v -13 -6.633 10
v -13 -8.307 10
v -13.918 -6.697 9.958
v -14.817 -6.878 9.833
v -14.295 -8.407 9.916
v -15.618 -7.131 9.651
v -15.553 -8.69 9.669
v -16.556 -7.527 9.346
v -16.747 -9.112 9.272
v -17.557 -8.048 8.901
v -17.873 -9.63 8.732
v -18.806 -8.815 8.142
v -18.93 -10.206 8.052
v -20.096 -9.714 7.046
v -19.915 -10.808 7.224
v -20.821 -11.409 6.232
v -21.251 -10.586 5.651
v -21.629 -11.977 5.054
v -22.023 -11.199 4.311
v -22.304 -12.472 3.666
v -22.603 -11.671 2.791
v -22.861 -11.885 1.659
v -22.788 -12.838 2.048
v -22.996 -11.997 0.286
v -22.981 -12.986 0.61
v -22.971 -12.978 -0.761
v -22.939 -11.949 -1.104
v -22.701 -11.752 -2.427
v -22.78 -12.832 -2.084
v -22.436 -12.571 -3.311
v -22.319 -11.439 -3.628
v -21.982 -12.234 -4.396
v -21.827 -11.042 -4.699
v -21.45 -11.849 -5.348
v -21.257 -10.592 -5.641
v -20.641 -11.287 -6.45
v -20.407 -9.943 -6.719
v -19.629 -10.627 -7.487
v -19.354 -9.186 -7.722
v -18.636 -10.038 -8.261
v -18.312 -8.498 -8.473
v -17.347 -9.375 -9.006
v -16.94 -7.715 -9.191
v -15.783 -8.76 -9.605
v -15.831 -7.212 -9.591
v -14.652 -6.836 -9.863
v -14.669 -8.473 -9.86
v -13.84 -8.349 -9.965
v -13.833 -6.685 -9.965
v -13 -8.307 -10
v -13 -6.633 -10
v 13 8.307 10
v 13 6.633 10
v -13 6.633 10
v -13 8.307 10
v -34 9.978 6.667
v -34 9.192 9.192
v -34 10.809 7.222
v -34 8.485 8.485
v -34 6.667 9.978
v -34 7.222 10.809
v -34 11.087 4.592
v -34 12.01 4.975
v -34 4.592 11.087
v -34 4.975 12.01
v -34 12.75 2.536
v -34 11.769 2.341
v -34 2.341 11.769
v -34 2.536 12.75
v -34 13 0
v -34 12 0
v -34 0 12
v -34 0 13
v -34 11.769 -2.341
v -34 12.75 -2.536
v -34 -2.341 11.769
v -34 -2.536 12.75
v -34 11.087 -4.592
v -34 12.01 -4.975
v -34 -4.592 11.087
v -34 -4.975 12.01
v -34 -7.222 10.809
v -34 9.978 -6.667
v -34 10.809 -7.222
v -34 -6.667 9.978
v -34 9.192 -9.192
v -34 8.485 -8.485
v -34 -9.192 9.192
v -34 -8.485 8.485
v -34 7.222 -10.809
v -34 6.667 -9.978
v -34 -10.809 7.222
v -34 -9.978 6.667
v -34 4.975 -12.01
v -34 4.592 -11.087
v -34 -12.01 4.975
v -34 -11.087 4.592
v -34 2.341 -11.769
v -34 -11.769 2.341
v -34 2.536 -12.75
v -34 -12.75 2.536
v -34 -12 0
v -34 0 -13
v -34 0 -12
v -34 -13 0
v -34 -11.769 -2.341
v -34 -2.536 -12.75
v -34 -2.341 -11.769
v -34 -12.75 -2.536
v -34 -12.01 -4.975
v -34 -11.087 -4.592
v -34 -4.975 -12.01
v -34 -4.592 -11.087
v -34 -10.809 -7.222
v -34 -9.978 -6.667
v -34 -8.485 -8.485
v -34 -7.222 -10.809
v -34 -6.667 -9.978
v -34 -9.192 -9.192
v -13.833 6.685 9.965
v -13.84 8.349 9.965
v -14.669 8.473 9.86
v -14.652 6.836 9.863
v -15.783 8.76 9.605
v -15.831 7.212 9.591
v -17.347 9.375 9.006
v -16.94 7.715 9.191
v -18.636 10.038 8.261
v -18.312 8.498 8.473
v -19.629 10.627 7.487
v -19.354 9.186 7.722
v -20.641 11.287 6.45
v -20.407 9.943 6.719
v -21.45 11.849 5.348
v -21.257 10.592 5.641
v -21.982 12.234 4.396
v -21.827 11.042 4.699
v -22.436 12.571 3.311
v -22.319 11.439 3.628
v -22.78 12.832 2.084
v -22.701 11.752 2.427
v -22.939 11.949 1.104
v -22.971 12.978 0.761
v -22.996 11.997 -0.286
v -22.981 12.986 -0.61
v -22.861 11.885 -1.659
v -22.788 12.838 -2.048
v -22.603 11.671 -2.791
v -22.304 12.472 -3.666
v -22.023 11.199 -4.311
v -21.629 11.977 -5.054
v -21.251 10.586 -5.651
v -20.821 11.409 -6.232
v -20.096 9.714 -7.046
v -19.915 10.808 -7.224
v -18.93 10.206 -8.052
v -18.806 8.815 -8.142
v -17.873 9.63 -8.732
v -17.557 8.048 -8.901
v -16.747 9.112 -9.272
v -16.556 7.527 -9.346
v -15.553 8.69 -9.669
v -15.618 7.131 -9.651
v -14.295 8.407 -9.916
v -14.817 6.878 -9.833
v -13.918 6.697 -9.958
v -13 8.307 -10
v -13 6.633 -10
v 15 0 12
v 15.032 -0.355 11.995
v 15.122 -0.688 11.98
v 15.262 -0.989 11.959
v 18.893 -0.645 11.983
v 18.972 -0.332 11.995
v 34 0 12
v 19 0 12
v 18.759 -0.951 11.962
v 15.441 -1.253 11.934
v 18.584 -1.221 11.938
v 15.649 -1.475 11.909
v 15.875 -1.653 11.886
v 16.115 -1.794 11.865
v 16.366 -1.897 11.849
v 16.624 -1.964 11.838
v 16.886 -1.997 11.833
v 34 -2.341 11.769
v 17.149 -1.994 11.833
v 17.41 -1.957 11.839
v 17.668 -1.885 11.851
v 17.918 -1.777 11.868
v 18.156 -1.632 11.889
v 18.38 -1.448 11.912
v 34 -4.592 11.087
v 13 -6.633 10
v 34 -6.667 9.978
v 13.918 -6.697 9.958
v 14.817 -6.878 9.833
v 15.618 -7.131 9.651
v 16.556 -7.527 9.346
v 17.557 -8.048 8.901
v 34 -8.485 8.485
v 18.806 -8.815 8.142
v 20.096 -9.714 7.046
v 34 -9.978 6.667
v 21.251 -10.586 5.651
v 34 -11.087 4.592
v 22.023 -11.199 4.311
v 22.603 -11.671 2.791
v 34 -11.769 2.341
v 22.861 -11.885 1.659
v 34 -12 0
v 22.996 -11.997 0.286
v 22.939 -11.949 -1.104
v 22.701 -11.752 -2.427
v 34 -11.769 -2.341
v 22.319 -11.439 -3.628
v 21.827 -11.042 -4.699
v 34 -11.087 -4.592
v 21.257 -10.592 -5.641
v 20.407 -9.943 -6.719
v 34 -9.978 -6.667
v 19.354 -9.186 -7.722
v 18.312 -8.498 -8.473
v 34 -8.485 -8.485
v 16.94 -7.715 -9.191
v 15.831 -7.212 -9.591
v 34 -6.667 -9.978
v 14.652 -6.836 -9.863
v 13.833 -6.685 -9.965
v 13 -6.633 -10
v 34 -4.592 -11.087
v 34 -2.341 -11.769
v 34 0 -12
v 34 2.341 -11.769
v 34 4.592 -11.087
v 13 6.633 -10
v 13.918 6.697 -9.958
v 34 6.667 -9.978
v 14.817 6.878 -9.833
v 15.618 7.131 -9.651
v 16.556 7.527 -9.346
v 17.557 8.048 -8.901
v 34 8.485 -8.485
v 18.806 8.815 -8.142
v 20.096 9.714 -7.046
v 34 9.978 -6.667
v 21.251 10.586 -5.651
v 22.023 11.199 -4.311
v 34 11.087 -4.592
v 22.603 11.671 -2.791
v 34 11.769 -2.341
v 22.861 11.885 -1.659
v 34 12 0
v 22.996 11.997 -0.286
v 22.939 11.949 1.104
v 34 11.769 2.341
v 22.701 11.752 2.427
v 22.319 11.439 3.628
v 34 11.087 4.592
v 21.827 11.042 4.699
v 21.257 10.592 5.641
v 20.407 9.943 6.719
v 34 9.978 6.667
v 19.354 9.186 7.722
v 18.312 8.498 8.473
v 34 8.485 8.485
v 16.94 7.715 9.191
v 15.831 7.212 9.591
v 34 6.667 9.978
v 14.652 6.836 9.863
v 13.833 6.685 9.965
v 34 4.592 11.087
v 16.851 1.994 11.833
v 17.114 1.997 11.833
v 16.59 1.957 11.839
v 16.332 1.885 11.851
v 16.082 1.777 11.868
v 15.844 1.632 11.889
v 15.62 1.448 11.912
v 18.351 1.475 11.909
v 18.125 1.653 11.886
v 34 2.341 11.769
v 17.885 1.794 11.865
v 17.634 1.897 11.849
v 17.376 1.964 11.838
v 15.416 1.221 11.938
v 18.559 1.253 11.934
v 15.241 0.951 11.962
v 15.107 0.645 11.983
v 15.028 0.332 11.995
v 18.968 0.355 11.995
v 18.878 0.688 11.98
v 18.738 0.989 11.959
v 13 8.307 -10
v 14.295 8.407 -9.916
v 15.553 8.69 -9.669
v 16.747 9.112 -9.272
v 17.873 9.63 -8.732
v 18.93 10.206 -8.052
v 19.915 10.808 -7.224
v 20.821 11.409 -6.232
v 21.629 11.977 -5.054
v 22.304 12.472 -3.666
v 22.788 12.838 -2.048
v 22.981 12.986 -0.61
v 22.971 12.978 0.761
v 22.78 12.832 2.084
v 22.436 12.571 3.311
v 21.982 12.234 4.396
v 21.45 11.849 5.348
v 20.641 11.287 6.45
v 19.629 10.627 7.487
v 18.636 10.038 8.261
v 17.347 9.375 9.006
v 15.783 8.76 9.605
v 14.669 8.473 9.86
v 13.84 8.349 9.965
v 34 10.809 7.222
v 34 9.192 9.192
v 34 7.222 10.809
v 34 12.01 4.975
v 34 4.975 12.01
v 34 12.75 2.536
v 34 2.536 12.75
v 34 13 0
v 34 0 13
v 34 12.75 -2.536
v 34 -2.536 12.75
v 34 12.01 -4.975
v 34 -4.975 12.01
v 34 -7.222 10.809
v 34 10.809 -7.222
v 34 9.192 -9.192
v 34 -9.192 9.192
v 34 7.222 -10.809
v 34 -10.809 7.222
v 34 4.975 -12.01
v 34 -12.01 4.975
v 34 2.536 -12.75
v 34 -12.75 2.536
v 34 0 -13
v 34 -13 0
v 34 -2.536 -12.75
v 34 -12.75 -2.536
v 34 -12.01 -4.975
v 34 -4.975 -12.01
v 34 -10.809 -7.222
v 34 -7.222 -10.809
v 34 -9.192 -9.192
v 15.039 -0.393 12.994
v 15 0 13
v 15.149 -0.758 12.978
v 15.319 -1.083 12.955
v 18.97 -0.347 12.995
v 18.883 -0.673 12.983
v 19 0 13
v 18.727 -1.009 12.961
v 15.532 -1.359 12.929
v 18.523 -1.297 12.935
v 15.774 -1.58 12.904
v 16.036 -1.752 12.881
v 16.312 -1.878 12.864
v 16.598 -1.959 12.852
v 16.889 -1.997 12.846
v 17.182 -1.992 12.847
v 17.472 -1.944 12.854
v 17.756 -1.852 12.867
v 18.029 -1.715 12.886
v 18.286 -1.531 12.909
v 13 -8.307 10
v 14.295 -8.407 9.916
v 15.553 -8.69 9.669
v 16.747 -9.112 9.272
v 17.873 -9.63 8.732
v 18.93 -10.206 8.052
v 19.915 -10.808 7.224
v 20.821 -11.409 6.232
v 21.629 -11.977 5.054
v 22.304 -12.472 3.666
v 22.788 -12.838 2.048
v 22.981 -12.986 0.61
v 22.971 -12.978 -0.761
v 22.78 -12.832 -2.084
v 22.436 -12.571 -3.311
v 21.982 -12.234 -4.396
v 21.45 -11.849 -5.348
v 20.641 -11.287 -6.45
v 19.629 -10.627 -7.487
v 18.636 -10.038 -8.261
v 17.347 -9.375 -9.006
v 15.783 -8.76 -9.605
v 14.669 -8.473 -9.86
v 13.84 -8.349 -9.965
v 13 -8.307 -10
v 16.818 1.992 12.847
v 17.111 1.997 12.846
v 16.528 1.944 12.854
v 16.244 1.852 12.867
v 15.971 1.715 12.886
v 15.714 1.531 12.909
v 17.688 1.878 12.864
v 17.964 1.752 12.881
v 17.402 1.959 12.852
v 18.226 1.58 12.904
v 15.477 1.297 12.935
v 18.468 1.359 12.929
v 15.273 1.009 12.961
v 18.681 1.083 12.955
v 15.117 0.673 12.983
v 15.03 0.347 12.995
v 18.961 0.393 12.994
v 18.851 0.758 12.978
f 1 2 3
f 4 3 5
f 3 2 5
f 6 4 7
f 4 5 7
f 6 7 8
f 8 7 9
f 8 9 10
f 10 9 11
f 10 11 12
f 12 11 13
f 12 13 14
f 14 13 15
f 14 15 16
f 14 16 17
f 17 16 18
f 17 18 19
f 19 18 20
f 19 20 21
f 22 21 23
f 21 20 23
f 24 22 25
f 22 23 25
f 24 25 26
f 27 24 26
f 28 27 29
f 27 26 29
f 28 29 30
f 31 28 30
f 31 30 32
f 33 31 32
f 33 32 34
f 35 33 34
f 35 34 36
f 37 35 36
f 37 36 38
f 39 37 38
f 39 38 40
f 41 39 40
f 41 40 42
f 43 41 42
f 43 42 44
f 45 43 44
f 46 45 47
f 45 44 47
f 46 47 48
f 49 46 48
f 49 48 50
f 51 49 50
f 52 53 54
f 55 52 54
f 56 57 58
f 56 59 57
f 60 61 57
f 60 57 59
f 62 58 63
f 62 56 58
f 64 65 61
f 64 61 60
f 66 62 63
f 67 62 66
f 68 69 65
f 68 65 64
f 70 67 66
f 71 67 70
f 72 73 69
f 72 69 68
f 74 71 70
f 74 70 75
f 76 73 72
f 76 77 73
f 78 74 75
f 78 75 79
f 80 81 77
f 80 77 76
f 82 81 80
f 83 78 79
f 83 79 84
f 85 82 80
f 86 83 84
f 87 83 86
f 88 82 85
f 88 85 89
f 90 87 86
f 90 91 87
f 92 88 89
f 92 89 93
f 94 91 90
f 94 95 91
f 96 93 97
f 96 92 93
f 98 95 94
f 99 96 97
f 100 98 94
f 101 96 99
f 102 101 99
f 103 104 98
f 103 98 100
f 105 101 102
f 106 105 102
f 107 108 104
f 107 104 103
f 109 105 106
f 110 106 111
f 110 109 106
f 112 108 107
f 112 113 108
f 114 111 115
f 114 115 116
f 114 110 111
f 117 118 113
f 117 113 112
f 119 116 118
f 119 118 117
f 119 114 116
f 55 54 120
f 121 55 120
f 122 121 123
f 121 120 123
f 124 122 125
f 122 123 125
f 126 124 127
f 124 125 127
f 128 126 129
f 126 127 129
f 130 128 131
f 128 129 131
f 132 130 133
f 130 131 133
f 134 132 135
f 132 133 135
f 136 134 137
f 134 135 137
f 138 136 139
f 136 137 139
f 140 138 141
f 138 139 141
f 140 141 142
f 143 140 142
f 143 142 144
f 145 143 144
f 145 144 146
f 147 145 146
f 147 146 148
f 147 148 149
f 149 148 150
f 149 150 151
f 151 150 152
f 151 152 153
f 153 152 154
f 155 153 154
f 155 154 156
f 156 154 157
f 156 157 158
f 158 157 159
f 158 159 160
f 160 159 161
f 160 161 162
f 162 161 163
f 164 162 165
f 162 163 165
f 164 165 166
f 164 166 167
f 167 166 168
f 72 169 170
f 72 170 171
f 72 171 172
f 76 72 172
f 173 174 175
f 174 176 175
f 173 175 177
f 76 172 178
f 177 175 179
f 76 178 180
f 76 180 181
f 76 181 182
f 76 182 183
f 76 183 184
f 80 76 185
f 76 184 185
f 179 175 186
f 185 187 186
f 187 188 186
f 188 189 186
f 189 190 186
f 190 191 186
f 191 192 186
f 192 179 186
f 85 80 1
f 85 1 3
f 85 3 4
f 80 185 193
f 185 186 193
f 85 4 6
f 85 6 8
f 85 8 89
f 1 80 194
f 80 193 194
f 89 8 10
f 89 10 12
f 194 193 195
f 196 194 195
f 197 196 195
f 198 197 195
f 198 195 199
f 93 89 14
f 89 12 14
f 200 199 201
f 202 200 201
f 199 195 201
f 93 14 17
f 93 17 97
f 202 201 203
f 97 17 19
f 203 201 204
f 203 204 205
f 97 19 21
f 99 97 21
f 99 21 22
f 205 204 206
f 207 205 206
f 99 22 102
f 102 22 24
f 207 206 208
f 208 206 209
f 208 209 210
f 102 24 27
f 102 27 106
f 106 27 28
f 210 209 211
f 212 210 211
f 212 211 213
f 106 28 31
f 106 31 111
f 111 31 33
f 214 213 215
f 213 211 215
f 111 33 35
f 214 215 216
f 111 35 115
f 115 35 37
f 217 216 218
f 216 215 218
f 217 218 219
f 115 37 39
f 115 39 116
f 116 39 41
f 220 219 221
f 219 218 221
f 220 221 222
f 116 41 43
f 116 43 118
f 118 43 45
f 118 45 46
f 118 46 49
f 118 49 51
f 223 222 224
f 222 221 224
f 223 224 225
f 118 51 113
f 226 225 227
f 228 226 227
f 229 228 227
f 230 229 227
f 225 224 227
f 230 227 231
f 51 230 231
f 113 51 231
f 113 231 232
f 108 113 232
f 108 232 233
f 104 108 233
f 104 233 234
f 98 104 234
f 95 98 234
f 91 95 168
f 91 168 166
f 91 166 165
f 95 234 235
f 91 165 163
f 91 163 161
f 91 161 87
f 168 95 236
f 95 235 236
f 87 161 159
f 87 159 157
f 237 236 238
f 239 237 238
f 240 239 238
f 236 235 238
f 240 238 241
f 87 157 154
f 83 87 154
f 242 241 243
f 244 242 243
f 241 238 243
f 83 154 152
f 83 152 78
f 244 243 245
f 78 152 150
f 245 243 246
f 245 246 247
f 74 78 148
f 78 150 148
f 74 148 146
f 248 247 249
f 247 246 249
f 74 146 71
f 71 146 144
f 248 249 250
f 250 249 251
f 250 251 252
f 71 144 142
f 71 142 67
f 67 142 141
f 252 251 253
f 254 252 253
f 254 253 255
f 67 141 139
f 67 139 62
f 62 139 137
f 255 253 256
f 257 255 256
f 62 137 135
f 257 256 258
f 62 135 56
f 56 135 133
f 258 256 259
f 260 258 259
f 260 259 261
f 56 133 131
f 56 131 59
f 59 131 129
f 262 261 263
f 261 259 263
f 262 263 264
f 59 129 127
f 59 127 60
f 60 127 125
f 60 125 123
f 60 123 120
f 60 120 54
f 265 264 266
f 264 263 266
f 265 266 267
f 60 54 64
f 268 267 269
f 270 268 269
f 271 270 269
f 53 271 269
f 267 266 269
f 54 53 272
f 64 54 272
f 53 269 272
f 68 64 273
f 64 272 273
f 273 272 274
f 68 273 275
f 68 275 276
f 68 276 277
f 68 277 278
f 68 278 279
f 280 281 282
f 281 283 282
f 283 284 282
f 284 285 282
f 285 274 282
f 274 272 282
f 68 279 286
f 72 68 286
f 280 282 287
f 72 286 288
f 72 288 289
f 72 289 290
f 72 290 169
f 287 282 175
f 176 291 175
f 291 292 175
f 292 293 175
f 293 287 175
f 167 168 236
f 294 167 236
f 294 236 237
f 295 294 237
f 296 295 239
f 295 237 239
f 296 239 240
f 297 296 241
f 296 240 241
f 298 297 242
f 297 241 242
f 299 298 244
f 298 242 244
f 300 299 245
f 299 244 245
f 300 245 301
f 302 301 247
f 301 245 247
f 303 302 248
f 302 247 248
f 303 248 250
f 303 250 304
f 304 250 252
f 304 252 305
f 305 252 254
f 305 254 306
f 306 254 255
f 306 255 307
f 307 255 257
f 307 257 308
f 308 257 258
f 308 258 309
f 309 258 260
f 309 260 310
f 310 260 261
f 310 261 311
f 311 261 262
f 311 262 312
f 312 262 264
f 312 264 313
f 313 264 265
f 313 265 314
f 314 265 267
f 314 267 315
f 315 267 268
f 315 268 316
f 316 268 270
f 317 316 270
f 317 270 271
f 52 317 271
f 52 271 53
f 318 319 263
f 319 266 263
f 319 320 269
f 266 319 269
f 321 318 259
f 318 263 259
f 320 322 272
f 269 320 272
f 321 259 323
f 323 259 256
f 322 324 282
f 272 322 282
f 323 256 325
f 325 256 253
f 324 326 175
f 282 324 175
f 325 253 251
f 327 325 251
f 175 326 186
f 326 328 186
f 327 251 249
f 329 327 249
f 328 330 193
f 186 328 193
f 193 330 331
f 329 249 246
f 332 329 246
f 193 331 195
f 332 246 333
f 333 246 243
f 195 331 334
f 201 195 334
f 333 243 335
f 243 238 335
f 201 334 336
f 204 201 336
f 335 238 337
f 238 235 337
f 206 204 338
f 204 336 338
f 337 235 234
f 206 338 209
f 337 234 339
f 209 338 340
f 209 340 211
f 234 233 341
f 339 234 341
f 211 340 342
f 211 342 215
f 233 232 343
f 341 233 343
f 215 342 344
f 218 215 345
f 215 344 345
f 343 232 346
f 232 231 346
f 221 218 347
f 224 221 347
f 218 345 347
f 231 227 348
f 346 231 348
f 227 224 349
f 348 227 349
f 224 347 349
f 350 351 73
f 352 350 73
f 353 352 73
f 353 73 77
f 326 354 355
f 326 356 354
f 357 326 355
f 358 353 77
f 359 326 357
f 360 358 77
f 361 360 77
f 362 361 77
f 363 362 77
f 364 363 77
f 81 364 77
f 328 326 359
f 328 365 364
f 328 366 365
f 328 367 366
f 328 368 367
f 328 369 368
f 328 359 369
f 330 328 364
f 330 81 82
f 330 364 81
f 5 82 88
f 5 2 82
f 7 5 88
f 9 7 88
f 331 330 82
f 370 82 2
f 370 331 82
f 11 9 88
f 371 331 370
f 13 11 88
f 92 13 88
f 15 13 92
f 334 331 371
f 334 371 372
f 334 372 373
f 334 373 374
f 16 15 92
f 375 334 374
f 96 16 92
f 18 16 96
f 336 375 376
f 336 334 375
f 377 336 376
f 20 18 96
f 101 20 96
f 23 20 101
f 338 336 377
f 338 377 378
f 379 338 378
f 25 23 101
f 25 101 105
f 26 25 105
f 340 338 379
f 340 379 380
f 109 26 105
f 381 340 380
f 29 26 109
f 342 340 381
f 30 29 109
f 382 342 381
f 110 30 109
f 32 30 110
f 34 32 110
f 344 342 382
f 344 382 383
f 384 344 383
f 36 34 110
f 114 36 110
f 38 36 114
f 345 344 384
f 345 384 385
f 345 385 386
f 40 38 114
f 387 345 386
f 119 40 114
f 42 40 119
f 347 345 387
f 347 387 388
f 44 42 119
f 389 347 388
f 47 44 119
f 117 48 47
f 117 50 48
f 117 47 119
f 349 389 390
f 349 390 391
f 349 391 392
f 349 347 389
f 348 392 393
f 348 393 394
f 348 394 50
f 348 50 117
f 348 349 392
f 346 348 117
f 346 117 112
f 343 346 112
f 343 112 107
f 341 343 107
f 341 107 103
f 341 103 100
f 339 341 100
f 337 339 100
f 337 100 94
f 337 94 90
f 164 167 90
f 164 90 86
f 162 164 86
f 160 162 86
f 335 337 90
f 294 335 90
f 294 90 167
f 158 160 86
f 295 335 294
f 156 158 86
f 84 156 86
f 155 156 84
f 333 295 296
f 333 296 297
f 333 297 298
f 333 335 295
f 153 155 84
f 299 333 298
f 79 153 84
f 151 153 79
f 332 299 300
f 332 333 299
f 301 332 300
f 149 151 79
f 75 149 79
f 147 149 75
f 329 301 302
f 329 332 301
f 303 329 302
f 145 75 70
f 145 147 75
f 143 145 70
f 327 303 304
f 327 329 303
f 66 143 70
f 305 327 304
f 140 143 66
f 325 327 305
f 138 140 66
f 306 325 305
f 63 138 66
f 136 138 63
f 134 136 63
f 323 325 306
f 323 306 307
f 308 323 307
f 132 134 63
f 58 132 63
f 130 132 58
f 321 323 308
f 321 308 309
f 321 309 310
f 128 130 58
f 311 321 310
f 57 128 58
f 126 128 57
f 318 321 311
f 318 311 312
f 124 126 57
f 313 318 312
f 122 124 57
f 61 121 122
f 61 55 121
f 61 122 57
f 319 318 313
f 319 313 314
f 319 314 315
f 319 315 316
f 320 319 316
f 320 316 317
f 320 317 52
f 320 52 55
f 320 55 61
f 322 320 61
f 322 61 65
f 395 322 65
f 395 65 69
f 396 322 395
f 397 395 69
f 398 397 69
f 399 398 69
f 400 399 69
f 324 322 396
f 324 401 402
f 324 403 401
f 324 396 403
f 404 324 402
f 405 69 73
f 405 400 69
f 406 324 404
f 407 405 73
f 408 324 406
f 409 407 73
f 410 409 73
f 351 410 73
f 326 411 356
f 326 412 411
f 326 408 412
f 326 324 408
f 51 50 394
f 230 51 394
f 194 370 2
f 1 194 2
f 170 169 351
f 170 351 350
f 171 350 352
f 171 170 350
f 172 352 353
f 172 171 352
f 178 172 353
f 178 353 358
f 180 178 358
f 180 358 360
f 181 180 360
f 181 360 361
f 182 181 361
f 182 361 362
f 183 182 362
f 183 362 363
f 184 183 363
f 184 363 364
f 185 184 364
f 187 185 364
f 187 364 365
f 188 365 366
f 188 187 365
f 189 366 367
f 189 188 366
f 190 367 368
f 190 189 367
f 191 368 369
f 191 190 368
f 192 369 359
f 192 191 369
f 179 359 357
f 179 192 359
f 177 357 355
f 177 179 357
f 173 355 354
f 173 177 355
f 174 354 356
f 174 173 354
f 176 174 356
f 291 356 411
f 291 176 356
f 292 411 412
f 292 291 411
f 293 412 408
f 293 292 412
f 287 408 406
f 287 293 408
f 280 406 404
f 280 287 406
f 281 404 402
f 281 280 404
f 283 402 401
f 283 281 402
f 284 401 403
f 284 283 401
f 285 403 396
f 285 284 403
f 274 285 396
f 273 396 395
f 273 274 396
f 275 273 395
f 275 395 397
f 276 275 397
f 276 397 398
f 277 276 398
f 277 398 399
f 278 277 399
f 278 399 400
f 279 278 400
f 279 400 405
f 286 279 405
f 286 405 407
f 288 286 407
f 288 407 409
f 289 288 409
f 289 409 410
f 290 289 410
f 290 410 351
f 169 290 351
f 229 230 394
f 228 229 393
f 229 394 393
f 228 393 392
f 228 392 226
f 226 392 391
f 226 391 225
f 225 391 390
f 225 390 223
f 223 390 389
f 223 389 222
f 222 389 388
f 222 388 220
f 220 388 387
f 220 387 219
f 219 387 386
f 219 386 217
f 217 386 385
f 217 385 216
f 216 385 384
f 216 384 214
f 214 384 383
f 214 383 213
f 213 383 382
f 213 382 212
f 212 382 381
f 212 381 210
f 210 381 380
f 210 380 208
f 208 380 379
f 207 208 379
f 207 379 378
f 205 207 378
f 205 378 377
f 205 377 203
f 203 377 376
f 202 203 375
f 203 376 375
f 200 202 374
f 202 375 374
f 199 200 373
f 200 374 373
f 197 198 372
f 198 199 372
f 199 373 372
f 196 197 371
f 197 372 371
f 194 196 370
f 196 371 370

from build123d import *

# Parameters (mm, degrees)
SKETCH1_W               = 68
SKETCH1_H               = 1
CUT_EXTRUDE1_DEPTH      = 39.65229618
CUT_EXTRUDE1_DEPTH_BACK = 39.65229618
SKETCH3_R               = 2
CUT_EXTRUDE2_DEPTH      = 39.652296335


with BuildPart() as part:
    # Sketch1 → Revolve1 (revolve)
    with BuildSketch(Plane.XY, mode=Mode.PRIVATE) as revolve1_sk:
        with Locations((0, 12.5)):
            Rectangle(SKETCH1_W, SKETCH1_H)
    revolve(revolve1_sk.sketch.rotate(Axis((-43.269534002, 0, 0), (1, 0, 0)), 90), axis=Axis((-43.269534002, 0, 0), (1, 0, 0)))

    # Sketch2 → Cut-Extrude1 (cut, two sides: drawn at the far end of the back side and taken through both)
    with BuildSketch(Plane(origin=(0, 0, 0), x_dir=(1, 0, 0), z_dir=(0, 1, 0)).offset(-CUT_EXTRUDE1_DEPTH_BACK)):
        with BuildLine():
            Line((-13, 10), (13, 10))
            ThreePointArc((13, 10), (23, 0), (13, -10))
            Line((13, -10), (-13, -10))
            ThreePointArc((-13, -10), (-23, 0), (-13, 10))
        make_face()
    extrude(amount=CUT_EXTRUDE1_DEPTH + CUT_EXTRUDE1_DEPTH_BACK, mode=Mode.SUBTRACT)

    # Sketch3 → Cut-Extrude2 (cut, through all)
    with BuildSketch(Plane.XY):
        with Locations(Location((17, 0, 0), (0, 0, 180))):
            Circle(SKETCH3_R)
    extrude(amount=CUT_EXTRUDE2_DEPTH, mode=Mode.SUBTRACT)


solid = part.part
